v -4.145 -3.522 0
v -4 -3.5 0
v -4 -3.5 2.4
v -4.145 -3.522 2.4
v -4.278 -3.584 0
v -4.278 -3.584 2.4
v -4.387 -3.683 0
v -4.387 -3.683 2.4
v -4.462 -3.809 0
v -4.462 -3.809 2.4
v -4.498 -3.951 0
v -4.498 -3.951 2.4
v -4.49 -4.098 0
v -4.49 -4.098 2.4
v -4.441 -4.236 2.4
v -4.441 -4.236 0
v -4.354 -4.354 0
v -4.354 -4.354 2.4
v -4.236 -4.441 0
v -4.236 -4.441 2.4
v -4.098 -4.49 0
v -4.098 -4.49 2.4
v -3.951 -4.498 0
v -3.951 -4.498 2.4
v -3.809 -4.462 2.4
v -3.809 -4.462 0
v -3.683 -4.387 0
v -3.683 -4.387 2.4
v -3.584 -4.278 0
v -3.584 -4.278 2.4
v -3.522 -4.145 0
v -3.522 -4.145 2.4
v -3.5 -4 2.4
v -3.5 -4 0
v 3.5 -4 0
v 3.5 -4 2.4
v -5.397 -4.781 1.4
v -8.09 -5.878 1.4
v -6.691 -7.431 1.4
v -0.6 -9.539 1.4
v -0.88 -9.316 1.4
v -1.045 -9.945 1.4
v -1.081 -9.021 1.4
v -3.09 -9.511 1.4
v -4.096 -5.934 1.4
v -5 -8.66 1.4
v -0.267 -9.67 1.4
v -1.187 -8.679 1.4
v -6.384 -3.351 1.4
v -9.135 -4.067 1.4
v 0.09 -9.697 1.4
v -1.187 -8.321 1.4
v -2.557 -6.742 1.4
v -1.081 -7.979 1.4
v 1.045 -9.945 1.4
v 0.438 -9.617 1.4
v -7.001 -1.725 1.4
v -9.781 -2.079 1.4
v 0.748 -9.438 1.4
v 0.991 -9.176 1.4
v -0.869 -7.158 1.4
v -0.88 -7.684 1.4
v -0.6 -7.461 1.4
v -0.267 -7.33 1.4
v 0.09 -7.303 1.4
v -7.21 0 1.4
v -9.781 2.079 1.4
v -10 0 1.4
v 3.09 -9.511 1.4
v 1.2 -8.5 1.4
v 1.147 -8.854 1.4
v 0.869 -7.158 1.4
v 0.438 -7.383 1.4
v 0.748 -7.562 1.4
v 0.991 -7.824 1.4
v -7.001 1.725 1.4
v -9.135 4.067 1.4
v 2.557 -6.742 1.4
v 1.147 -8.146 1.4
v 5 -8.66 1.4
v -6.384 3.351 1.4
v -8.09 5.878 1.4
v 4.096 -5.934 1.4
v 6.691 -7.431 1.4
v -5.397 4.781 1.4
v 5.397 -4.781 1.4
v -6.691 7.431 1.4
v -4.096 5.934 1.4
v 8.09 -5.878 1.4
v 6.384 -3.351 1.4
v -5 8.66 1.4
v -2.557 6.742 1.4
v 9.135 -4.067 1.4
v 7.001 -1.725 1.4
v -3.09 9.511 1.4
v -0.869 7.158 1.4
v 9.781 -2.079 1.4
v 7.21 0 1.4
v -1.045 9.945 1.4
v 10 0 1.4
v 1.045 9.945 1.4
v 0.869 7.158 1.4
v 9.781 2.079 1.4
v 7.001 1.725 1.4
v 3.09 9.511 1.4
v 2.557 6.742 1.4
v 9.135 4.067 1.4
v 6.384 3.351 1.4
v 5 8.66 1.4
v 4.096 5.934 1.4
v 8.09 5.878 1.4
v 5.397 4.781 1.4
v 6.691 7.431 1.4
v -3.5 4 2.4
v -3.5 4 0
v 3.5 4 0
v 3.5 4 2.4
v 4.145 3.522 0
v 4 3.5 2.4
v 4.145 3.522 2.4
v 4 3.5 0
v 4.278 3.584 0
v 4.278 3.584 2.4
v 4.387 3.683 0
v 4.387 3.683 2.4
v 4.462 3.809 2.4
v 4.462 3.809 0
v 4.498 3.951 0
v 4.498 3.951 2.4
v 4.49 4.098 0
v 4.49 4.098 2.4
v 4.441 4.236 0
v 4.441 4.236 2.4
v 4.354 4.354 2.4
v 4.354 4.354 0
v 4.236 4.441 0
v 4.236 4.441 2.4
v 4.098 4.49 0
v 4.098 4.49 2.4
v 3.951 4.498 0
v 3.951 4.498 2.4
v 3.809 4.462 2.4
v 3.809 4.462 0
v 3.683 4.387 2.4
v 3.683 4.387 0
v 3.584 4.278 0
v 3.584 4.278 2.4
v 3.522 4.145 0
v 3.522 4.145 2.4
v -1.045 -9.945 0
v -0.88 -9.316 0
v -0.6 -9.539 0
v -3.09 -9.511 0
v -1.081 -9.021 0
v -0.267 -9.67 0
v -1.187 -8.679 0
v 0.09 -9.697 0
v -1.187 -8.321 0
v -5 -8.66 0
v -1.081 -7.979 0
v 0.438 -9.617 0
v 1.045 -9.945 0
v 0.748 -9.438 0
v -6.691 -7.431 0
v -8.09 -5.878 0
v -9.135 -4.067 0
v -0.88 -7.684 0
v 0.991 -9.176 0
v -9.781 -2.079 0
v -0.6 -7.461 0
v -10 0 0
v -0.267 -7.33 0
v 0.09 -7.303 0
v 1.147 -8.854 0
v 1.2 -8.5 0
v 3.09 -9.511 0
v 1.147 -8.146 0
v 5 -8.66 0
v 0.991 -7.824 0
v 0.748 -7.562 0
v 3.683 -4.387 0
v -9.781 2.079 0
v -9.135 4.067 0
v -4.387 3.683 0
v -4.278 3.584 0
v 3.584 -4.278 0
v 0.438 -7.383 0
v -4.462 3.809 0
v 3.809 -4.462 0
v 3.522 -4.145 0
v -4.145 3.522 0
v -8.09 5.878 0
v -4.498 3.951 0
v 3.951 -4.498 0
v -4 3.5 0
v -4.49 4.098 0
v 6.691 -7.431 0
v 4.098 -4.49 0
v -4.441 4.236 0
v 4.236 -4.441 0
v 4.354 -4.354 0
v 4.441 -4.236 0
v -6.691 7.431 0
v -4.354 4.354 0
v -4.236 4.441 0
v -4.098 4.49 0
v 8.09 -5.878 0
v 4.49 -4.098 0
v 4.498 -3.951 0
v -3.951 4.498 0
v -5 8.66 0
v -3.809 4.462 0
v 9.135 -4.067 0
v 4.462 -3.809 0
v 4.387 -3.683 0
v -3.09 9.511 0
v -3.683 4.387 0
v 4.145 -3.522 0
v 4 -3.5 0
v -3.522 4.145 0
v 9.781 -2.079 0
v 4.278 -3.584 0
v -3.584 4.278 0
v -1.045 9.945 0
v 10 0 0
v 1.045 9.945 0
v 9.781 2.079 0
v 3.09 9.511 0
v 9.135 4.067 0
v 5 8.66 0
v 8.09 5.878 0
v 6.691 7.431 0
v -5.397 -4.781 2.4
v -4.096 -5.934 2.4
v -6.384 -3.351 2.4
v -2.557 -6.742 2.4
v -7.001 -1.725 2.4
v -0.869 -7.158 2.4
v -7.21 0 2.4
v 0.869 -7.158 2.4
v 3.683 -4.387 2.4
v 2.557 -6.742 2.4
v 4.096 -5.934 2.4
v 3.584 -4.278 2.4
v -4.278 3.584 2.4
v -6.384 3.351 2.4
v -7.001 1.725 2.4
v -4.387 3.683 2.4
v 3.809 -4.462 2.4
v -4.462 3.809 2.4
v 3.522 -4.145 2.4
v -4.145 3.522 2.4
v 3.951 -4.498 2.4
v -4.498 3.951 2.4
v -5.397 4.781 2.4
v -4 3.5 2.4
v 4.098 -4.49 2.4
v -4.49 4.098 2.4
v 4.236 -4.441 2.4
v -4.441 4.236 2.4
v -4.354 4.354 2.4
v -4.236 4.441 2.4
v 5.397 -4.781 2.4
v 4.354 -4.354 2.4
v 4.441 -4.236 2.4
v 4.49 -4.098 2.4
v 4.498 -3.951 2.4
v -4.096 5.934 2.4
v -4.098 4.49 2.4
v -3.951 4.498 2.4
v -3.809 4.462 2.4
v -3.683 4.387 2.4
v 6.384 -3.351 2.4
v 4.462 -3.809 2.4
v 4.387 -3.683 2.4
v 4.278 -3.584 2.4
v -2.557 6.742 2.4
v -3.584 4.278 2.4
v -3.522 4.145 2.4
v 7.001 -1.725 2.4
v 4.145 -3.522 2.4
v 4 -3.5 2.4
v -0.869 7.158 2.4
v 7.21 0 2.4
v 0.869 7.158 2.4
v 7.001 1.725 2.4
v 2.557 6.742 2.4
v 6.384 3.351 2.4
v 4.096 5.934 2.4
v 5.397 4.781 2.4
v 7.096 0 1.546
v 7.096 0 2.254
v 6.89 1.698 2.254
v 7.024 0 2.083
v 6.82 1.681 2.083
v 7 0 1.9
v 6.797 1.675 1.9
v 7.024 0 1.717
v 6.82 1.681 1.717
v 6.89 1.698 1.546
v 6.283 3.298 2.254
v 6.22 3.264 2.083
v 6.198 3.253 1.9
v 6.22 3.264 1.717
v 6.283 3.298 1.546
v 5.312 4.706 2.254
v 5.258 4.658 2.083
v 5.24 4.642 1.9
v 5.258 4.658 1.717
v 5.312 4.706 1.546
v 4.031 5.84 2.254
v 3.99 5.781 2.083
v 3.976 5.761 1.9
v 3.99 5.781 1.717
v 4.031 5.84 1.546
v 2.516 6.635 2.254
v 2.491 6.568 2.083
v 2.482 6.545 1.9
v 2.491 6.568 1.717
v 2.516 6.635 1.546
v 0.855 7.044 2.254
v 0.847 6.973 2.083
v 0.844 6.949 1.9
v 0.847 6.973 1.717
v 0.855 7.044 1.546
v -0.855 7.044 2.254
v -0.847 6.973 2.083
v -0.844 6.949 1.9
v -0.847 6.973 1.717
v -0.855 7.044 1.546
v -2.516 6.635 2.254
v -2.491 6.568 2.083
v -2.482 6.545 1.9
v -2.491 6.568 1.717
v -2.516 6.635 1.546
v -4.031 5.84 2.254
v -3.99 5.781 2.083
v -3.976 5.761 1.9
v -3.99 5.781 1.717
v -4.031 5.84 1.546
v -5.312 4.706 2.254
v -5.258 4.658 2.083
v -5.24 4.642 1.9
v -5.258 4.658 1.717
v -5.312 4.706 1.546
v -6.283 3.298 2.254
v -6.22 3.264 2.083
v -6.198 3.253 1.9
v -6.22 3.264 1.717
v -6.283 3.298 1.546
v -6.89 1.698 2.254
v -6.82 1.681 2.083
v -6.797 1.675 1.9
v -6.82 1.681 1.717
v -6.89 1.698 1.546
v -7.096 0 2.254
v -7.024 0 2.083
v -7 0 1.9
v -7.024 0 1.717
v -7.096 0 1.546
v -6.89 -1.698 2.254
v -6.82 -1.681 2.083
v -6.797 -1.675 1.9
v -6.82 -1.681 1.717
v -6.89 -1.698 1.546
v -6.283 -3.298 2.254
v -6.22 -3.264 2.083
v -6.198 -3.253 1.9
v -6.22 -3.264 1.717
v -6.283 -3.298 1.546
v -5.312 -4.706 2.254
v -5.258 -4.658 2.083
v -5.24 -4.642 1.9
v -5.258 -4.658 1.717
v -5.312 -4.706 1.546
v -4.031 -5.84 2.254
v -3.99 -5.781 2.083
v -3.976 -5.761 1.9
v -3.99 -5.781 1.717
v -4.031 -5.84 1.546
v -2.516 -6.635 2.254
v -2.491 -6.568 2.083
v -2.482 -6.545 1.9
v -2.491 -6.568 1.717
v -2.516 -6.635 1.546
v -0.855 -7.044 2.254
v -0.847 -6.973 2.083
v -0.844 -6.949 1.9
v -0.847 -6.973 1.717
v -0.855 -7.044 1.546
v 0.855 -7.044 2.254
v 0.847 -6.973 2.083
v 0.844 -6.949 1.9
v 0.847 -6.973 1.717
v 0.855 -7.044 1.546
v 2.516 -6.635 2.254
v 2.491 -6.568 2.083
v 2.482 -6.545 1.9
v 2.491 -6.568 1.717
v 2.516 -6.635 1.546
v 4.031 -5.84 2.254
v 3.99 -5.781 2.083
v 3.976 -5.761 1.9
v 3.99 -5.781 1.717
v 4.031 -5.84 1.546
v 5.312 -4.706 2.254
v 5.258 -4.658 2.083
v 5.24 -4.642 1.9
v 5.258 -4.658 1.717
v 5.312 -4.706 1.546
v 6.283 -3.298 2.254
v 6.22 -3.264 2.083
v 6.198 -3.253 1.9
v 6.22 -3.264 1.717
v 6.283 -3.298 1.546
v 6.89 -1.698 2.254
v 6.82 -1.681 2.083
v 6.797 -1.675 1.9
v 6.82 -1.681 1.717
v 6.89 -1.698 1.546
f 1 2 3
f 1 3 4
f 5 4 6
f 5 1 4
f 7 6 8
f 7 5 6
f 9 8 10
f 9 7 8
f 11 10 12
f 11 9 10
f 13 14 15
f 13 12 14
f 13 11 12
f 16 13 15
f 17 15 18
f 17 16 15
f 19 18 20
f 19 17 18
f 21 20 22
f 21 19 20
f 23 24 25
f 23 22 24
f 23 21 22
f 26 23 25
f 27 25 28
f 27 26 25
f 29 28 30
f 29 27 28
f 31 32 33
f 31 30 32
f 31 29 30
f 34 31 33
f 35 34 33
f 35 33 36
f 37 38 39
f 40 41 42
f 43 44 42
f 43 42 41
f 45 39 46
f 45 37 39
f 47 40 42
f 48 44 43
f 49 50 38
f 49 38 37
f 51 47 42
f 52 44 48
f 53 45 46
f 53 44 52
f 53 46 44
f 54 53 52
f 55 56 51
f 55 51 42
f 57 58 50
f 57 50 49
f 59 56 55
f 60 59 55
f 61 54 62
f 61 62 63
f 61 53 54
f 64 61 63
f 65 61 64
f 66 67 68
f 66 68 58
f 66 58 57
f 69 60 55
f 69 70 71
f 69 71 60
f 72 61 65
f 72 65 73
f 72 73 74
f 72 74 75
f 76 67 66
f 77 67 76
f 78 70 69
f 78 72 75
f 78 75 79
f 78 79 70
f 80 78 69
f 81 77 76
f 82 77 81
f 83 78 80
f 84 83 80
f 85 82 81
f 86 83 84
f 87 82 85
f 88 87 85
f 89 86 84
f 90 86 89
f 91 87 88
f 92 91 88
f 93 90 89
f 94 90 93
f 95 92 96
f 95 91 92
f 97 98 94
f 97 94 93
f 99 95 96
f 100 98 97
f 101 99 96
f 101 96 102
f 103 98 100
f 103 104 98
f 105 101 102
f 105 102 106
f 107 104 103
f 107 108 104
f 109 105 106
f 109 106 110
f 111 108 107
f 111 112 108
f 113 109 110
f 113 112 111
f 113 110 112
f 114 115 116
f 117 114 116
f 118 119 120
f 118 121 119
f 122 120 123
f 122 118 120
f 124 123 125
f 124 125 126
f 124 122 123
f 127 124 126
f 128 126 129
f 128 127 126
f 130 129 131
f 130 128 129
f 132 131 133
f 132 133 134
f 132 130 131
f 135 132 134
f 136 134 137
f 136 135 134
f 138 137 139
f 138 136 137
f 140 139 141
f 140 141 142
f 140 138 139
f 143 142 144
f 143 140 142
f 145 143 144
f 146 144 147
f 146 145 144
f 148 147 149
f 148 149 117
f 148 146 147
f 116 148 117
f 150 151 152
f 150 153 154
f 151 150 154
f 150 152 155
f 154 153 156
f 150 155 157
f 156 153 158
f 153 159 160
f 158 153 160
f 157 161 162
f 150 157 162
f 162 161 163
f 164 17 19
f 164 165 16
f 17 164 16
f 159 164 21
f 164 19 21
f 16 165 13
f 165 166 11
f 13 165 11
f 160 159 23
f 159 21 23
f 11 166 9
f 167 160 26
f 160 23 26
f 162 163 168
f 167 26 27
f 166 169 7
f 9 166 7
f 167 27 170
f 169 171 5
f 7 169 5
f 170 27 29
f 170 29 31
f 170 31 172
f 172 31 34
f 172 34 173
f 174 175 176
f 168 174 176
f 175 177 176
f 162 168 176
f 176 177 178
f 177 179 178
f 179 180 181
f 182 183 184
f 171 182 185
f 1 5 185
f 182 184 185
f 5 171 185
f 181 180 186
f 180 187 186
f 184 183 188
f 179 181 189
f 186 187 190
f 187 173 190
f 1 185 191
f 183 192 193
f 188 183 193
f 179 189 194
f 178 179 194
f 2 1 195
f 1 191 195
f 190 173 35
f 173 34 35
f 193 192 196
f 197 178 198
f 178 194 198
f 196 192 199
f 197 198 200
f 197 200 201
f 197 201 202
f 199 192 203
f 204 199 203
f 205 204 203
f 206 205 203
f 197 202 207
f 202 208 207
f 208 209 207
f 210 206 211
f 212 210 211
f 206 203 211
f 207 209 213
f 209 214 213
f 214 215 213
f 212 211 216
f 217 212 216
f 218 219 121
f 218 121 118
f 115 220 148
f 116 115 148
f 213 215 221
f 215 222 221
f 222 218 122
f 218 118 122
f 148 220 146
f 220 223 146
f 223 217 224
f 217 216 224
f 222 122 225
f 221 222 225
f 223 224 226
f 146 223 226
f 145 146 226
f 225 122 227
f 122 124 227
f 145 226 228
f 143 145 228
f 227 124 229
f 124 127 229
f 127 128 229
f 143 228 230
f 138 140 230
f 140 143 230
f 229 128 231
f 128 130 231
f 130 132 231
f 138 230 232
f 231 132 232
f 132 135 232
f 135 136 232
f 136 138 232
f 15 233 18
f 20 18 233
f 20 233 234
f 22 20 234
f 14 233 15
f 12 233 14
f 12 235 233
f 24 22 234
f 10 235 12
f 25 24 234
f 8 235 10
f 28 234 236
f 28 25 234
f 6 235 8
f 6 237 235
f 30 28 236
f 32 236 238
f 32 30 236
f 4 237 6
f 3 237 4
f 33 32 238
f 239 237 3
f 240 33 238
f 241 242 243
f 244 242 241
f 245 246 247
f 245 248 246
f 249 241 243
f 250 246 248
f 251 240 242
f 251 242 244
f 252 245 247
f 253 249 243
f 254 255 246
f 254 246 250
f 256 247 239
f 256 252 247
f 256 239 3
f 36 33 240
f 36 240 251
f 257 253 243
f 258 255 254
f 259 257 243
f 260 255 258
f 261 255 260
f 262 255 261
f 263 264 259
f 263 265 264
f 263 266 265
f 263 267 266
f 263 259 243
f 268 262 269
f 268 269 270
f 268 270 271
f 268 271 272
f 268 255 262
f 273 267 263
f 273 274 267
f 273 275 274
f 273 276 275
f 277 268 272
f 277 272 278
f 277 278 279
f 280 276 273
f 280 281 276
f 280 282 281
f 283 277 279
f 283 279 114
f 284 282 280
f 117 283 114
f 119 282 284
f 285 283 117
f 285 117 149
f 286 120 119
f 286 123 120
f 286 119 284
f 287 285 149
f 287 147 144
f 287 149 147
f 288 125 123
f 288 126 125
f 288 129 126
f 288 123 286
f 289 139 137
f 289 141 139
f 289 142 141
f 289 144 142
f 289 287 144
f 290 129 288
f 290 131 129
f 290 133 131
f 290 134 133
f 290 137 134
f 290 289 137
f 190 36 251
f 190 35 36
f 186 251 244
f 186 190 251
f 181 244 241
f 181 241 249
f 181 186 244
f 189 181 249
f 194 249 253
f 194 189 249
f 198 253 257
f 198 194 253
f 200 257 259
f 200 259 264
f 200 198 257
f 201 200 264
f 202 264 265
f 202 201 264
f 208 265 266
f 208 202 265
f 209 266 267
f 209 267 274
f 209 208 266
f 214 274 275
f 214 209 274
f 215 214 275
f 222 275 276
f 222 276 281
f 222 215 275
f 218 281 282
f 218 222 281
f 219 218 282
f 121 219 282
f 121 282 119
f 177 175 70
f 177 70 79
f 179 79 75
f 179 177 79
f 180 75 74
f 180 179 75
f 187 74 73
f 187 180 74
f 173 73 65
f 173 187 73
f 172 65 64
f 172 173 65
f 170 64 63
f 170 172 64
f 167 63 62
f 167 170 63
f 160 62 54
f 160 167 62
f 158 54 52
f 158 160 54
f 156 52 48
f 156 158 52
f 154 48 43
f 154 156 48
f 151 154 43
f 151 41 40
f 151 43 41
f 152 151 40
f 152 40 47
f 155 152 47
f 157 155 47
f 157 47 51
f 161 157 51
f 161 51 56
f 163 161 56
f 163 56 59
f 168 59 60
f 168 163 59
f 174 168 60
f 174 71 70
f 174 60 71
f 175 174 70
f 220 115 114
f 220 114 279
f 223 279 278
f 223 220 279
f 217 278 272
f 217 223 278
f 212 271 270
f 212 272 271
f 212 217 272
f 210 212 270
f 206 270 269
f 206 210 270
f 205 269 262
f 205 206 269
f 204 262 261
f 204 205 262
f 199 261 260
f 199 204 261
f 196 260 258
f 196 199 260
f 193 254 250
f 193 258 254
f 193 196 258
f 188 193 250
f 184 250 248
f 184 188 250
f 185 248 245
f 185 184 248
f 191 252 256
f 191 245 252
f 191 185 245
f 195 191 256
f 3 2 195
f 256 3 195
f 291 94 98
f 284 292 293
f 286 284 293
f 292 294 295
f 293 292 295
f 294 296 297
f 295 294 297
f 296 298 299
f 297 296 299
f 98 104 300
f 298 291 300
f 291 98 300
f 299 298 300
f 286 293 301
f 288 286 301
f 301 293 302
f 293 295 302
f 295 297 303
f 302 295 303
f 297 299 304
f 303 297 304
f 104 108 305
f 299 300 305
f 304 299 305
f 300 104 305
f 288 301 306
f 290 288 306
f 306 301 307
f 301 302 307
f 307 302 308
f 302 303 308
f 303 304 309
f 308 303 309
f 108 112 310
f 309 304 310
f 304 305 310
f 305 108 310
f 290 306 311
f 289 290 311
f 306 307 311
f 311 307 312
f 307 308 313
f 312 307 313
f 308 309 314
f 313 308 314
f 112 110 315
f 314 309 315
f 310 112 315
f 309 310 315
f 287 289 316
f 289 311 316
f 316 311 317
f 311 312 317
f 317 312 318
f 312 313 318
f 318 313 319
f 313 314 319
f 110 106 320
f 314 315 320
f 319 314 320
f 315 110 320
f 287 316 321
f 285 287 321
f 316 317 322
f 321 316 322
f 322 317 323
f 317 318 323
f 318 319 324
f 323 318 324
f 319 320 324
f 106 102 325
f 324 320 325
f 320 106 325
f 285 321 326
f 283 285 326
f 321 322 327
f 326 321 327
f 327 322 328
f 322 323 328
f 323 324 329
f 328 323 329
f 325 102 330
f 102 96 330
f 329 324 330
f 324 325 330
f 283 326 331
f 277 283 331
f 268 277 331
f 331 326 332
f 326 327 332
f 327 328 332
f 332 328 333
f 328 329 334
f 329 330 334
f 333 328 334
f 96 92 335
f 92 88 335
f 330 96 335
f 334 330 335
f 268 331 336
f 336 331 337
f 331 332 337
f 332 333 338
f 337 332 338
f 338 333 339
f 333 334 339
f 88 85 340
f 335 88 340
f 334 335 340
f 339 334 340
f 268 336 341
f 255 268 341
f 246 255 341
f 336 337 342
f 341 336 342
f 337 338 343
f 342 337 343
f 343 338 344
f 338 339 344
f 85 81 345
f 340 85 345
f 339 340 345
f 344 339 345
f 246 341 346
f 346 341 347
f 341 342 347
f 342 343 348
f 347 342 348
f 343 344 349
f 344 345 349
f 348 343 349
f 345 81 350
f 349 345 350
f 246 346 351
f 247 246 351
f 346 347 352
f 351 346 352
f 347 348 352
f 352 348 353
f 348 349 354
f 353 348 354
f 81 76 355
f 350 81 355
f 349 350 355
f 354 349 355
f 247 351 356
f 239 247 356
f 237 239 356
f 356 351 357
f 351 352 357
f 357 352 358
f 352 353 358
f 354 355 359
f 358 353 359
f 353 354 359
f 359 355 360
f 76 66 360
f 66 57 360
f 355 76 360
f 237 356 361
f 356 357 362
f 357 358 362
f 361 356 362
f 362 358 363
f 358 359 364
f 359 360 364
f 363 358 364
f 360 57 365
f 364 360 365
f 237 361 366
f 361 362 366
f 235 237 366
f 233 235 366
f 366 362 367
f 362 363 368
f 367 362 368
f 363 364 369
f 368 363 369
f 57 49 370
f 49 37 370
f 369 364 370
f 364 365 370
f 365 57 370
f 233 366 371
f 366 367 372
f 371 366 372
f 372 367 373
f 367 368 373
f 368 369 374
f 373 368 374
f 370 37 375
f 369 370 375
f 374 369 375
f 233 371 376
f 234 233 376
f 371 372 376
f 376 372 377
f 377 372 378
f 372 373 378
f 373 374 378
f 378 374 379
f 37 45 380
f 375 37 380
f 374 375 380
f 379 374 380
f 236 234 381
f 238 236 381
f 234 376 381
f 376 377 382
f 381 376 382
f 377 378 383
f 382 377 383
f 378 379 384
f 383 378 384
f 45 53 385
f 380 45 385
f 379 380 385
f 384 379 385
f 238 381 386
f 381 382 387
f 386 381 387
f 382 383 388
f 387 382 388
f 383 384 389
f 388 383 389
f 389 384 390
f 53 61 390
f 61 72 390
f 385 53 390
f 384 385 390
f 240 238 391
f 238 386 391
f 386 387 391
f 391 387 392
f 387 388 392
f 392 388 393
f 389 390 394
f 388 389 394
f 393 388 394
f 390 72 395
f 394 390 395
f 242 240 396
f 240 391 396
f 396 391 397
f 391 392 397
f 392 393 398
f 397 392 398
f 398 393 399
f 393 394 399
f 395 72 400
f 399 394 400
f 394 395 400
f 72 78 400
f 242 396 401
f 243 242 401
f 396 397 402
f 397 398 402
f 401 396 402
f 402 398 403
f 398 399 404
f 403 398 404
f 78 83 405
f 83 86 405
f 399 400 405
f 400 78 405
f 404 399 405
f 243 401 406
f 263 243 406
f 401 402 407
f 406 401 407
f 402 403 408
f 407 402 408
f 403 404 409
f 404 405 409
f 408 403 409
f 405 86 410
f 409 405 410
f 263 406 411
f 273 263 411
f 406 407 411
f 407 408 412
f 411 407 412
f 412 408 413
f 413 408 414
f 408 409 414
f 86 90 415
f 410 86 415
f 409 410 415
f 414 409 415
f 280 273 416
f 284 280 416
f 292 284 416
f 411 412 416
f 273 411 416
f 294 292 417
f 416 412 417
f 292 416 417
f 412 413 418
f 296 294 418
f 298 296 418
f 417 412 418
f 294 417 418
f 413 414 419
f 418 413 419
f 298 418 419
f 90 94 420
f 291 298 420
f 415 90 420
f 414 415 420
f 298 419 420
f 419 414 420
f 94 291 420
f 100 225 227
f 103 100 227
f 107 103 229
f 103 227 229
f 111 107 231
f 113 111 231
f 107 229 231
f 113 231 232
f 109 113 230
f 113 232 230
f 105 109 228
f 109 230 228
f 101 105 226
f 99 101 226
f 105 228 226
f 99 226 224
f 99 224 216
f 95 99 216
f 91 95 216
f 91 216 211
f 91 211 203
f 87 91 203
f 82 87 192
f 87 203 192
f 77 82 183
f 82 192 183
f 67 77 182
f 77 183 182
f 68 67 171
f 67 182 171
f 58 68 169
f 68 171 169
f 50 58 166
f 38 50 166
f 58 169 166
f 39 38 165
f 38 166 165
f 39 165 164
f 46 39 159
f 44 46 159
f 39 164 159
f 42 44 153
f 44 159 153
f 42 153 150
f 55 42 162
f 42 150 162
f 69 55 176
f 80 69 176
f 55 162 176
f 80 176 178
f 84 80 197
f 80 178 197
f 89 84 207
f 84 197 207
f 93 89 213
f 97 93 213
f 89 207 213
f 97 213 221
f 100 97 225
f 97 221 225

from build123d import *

# Parameters (mm, degrees)
CYLINDER014_R     = 1.2
CYLINDER014_DEPTH = 3
CYLINDER013_R     = 0.5
CYLINDER013_DEPTH = 10
ARRAY013_X_COUNT  = 2
ARRAY013_X_PITCH  = 8
ARRAY013_Y_COUNT  = 2
ARRAY013_Y_PITCH  = 8
BOX016_W          = 8
BOX016_H          = 8
BOX016_DEPTH      = 10
TORUS_R           = 0.7
CYLINDER012_R     = 7.7
CYLINDER012_DEPTH = 2.4
CYLINDER003_R     = 10
CYLINDER003_DEPTH = 1.4


with BuildPart() as magnet:
    # Cylinder014 → Cylinder014 (new body)
    with BuildSketch(Plane(origin=(0, -8.5, -1), x_dir=(1, 0, 0), z_dir=(0, 0, 1))):
        Circle(CYLINDER014_R)
    extrude(amount=CYLINDER014_DEPTH)


with BuildPart() as array013:
    # Cylinder013 → Cylinder013 (new body)
    with BuildSketch(Plane(origin=(4, 4, -2), x_dir=(1, 0, 0), z_dir=(0, 0, 1))):
        Circle(CYLINDER013_R)
    extrude(amount=CYLINDER013_DEPTH)

    # Array013 X: Array013 ×2


with BuildPart() as array013_1:
    add(array013.part)
    with Locations(*[(-i * ARRAY013_X_PITCH, 0, 0) for i in range(1, ARRAY013_X_COUNT)]):
        add(array013.part)

    # Array013 Y: Array013 ×2


with BuildPart() as array013_2:
    add(array013_1.part)
    with Locations(*[(0, -i * ARRAY013_Y_PITCH, 0) for i in range(1, ARRAY013_Y_COUNT)]):
        add(array013_1.part)


with BuildPart() as vierkant:
    # Box016 → Box016 (new body)
    with BuildSketch(Plane(origin=(-4, -4, -2), x_dir=(1, 0, 0), z_dir=(0, 0, 1))):
        with Locations((4, 4)):
            Rectangle(BOX016_W, BOX016_H)
    extrude(amount=BOX016_DEPTH)


with BuildPart() as torus:
    # Torus → Torus (revolve)
    with BuildSketch(Plane(origin=(0, 0, 1.9), x_dir=(1, 0, 0), z_dir=(0, -1, 0))):
        with Locations((7.7, 0)):
            Circle(TORUS_R)
    revolve(axis=Axis((0, 0, 1.9), (0, 0, 1)))


with BuildPart() as cut017:
    # Cylinder012 → Cylinder012 (new body)
    with BuildSketch(Plane.XY):
        Circle(CYLINDER012_R)
    extrude(amount=CYLINDER012_DEPTH)

    # Cut017: cut Torus
    add(torus.part, mode=Mode.SUBTRACT)


with BuildPart() as magnethalter:
    # Cylinder003 → Cylinder003 (new body)
    with BuildSketch(Plane.XY):
        Circle(CYLINDER003_R)
    extrude(amount=CYLINDER003_DEPTH)

    # Fusion003: union Cut017
    add(cut017.part)

    # Cut018: cut Vierkant
    add(vierkant.part, mode=Mode.SUBTRACT)

    # Cut019: cut Array013
    add(array013_2.part, mode=Mode.SUBTRACT)

    # Cut020: cut Magnet
    add(magnet.part, mode=Mode.SUBTRACT)


solid = magnethalter.part
